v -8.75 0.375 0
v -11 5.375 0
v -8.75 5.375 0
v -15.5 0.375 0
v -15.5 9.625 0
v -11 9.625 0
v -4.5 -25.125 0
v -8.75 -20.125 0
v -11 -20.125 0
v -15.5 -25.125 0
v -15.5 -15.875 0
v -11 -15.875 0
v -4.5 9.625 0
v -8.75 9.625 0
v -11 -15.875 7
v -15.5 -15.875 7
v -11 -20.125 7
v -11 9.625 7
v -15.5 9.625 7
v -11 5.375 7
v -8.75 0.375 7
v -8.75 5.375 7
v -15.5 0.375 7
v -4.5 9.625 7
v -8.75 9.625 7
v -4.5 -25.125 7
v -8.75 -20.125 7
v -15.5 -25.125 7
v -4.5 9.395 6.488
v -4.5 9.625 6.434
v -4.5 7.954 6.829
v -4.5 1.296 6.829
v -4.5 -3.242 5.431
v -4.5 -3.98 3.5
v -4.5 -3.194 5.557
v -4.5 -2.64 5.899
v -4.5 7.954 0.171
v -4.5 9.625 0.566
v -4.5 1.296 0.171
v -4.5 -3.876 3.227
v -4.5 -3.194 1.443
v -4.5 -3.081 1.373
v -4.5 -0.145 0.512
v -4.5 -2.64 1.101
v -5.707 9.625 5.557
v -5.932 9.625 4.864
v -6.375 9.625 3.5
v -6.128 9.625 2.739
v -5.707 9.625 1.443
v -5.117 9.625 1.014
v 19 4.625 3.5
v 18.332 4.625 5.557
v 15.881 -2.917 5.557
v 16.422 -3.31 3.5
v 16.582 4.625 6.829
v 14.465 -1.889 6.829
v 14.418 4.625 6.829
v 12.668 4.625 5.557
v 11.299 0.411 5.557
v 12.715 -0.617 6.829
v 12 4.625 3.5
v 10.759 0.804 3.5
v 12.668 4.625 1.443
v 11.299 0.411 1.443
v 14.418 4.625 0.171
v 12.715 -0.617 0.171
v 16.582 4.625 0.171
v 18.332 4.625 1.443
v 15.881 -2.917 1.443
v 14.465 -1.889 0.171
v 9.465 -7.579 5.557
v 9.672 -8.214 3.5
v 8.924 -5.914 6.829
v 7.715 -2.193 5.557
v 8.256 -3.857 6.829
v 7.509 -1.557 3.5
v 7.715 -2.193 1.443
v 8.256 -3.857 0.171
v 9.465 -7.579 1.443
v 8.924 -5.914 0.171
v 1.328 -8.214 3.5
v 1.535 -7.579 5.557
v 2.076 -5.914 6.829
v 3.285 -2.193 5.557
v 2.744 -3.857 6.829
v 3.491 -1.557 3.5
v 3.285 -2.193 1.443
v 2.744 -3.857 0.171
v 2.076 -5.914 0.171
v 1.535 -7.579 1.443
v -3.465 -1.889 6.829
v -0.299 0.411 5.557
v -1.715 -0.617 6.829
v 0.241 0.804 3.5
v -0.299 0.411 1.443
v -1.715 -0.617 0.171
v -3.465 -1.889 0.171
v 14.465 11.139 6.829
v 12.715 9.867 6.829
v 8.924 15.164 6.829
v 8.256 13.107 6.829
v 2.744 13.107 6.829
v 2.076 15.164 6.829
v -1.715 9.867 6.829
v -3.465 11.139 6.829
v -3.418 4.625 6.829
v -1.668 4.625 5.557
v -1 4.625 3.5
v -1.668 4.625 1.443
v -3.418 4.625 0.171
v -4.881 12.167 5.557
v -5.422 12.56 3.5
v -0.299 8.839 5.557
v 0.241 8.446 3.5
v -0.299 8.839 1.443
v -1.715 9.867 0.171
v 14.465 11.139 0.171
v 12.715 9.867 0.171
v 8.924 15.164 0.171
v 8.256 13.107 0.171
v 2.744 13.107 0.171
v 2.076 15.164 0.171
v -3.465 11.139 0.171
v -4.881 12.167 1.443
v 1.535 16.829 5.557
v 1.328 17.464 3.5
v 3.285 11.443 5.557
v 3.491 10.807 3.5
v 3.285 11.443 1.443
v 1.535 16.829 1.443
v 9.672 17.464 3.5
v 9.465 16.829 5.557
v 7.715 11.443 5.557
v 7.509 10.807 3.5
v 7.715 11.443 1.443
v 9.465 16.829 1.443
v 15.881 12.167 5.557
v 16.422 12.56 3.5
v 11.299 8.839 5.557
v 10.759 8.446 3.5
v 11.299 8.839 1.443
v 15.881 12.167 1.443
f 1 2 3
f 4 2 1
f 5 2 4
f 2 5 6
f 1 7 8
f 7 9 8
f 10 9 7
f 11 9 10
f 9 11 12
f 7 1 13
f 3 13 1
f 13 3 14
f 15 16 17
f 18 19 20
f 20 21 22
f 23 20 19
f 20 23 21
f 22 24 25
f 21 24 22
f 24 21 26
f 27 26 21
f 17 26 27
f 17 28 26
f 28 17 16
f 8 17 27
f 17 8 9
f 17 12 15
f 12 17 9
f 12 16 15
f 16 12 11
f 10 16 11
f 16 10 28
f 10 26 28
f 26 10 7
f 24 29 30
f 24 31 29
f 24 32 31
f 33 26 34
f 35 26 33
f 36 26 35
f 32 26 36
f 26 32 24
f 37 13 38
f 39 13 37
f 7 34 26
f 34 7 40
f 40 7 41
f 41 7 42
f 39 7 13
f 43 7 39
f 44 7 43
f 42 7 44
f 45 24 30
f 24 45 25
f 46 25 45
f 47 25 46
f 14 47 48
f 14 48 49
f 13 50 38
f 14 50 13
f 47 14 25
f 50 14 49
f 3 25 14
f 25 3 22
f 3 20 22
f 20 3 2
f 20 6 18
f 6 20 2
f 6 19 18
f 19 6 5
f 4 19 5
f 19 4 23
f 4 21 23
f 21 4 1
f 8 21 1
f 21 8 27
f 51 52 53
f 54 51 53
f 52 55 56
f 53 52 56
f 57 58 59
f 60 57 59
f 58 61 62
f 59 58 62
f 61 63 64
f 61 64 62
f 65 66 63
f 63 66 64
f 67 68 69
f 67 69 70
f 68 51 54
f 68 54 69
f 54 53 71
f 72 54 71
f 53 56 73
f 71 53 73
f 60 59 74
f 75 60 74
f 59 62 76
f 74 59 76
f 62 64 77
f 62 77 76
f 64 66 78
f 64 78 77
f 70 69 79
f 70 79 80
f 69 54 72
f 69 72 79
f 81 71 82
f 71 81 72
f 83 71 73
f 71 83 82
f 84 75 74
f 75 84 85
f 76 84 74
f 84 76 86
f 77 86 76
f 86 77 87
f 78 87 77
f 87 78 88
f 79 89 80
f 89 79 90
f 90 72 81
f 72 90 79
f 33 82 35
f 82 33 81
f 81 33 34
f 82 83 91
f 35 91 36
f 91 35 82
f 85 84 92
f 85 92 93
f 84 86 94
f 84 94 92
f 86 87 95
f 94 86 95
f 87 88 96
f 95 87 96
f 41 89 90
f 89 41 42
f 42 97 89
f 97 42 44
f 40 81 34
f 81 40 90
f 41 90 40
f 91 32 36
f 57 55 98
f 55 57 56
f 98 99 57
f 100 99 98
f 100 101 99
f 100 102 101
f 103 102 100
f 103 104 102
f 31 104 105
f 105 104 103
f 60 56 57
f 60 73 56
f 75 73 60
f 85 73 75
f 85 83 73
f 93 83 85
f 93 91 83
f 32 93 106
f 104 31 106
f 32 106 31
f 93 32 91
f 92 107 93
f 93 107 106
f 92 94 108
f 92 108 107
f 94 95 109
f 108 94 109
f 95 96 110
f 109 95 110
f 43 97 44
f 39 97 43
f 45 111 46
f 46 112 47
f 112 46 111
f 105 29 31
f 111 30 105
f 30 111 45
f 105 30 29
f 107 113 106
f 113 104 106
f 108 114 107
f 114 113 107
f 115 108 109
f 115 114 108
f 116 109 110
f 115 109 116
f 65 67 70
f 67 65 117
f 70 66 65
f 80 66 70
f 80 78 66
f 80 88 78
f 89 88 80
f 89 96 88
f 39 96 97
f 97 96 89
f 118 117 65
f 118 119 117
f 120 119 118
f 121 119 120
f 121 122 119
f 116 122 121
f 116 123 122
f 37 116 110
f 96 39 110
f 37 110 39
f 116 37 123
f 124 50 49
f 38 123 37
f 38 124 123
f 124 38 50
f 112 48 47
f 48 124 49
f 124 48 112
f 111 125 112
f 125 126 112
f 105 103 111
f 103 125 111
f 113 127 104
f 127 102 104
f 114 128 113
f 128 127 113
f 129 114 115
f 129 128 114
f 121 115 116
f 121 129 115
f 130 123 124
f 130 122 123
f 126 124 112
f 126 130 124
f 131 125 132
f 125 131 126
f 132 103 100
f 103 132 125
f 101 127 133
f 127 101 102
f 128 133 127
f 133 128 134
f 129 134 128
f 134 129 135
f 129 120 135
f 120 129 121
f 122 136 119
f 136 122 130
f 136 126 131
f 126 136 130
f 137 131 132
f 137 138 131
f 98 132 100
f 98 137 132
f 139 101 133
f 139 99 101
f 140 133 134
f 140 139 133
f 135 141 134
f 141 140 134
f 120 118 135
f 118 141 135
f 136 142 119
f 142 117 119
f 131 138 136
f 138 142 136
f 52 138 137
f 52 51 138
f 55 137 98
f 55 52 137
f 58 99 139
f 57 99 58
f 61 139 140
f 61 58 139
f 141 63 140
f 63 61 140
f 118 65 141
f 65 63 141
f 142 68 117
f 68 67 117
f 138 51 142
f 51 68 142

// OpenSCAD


//////////////////////////
// Customizable settings
//////////////////////////

// Debug or Relase (Make sure in release mode when done previewing!)
BuildMode=0;			//[0:Debug,1:Release]

// Ring type
HookType = 2;		//[0:Hook, 1:Vertical Ring, 2:Horizontal Ring]

// Diameter of base of round part of knob (in mm).  (Knurled ridges are not included in this measurement.)
WallHookWidth = 7;	// [7:13]

// Number of wall hooks.  This is the part attaching to the cube wall.
WallHookCount = 2;	// [1:Single, 2:Double (recommended), 3:Triple]

// The size of the hook, the distance between the wall and the inner side of the hook;
HookDiameter = 10;	// [7:30]

// The Hook Overhang is used if you want to make the hook extend up from the normal semi-circle hook.
HookOverhang = 0;		// [0:20]



//Hook innerDiameter
//Hook overHang (part that protrudes up from normal curve of hook)
//Hook Width (part that hangs on the wall and the diameter of the hook)
//how many rows of the SteelWall are hung by the chimney with care?
module wallHook (innerDiameter = 10,hookOverhang = 5,hookWidth=7,hangerCount=2, fnn=50)
{
	//scary stuff, don't look at this!	
	translate([-(innerDiameter+ 11/2),-(innerDiameter+11/2)/2-(9.25+(hangerCount-1)*25.5)/2,hookWidth/2])
	union()
	{
		hangers(count=hangerCount,wid=hookWidth);	
		translate([innerDiameter + 11,9.25+(hangerCount-1)*25.5,0])
		rotate([0,0,180])
		hook(innerRad=innerDiameter/2, dia=hookWidth, ovrhang=hookOverhang, tall=9.25+(hangerCount-1)*25.5, fn=fnn);
	}
}

module wallRing (innerDiameter = 10, hookWidth=7, hangerCount=2,horizontal=1, fnn=50)
{
	//scary stuff, don't look at this!	
	translate([-(innerDiameter+ 11/2),-(innerDiameter+11/2)/2-(9.25+(hangerCount-1)*25.5)/2,hookWidth/2])
	union()
	{
		hangers(count=hangerCount,wid=hookWidth);	
		translate([innerDiameter + 11,9.25+(hangerCount-1)*25.5,0])
		rotate([0,0,180])
		loop(innerRad=innerDiameter/2, dia=hookWidth, tall=9.25+(hangerCount-1)*25.5,horiz=horizontal, fn=fnn);
	}
}

module hangers(count=1, wid=5)
{
	topSection=[[0,0],[11,0],[11,9.25],[6.75,9.25],[6.75,5],[4.5,5],[4.5,9.25],[0,9.25]];
	midSection=[[6.75,0],[11,0],[11,16.25],[6.75,16.25]];

	linear_extrude(height=wid,center=true)
	union()
	{
		for(i = [0:count-1])
		{
			translate([0,25.5*i,0])
			polygon(points=topSection,paths=[[0,1,2,3,4,5,6,7]]);
			if(i>0)
			{
				translate([0,9.25+(i-1)*25.5,0])
				polygon(points=midSection,paths=[[0,1,2,3]]);
			}
		}
	}
}

module hook(dia=5,innerRad=6, fn=50, tall=34.75, ovrhang=0)
{
	render()
	union()
	{
		difference()
		{
			rotate_extrude(convexity = fn/2, $fn=fn)
			translate([innerRad*2, 0, 0])
			circle(r = dia/2, $fn=fn);	
			translate([0,innerRad+dia/4,0])
			cube([innerRad*4+dia,innerRad*2+dia/2,dia],center=true);
		}

		translate([innerRad*2,tall/2,0])
		rotate([90,0,0])
		cylinder(r=dia/2,h=tall,$fn=fn,center=true);
	
		translate([-(innerRad*2),ovrhang/2,0])
		rotate([90,0,0])
		cylinder(r=dia/2,h=ovrhang,center=true,$fn=fn);
		
		translate([-(innerRad*2),ovrhang,0])
		sphere(r=dia/2,center=true, $fn=fn);
	}
}

module loop(dia=5,innerRad=6, fn=50, tall=34.75, horiz=1)
{
	render()
	union()
	{
		translate([0,innerRad,0])
		rotate([horiz*90,0,0])
		difference()
		{
			rotate_extrude(convexity = fn/2, $fn=fn)
			translate([innerRad*2, 0, 0])
			circle(r = dia/2, $fn=fn);	
			//translate([0,innerRad+dia/4,0])
			//#cube([innerRad*4+dia,innerRad*2+dia/2,dia],center=true);
		}

//		translate([innerRad*2,tall/2,0])
//		rotate([90,0,0])
//		#cylinder(r=dia/2,h=tall,$fn=fn,center=true);
	}
}

if(HookType==0)
	wallHook (innerDiameter=HookDiameter,hookOverhang=HookOverhang,hookWidth=WallHookWidth,hangerCount=WallHookCount, fnn=BuildMode*40 + 10);
if(HookType==1)
	wallRing (innerDiameter=HookDiameter,hookWidth=WallHookWidth,hangerCount=WallHookCount,horizontal=1, fnn=BuildMode*40 + 10);
if(HookType==2)
	wallRing (innerDiameter=HookDiameter,hookWidth=WallHookWidth,hangerCount=WallHookCount,horizontal=0, fnn=BuildMode*40 + 10);
